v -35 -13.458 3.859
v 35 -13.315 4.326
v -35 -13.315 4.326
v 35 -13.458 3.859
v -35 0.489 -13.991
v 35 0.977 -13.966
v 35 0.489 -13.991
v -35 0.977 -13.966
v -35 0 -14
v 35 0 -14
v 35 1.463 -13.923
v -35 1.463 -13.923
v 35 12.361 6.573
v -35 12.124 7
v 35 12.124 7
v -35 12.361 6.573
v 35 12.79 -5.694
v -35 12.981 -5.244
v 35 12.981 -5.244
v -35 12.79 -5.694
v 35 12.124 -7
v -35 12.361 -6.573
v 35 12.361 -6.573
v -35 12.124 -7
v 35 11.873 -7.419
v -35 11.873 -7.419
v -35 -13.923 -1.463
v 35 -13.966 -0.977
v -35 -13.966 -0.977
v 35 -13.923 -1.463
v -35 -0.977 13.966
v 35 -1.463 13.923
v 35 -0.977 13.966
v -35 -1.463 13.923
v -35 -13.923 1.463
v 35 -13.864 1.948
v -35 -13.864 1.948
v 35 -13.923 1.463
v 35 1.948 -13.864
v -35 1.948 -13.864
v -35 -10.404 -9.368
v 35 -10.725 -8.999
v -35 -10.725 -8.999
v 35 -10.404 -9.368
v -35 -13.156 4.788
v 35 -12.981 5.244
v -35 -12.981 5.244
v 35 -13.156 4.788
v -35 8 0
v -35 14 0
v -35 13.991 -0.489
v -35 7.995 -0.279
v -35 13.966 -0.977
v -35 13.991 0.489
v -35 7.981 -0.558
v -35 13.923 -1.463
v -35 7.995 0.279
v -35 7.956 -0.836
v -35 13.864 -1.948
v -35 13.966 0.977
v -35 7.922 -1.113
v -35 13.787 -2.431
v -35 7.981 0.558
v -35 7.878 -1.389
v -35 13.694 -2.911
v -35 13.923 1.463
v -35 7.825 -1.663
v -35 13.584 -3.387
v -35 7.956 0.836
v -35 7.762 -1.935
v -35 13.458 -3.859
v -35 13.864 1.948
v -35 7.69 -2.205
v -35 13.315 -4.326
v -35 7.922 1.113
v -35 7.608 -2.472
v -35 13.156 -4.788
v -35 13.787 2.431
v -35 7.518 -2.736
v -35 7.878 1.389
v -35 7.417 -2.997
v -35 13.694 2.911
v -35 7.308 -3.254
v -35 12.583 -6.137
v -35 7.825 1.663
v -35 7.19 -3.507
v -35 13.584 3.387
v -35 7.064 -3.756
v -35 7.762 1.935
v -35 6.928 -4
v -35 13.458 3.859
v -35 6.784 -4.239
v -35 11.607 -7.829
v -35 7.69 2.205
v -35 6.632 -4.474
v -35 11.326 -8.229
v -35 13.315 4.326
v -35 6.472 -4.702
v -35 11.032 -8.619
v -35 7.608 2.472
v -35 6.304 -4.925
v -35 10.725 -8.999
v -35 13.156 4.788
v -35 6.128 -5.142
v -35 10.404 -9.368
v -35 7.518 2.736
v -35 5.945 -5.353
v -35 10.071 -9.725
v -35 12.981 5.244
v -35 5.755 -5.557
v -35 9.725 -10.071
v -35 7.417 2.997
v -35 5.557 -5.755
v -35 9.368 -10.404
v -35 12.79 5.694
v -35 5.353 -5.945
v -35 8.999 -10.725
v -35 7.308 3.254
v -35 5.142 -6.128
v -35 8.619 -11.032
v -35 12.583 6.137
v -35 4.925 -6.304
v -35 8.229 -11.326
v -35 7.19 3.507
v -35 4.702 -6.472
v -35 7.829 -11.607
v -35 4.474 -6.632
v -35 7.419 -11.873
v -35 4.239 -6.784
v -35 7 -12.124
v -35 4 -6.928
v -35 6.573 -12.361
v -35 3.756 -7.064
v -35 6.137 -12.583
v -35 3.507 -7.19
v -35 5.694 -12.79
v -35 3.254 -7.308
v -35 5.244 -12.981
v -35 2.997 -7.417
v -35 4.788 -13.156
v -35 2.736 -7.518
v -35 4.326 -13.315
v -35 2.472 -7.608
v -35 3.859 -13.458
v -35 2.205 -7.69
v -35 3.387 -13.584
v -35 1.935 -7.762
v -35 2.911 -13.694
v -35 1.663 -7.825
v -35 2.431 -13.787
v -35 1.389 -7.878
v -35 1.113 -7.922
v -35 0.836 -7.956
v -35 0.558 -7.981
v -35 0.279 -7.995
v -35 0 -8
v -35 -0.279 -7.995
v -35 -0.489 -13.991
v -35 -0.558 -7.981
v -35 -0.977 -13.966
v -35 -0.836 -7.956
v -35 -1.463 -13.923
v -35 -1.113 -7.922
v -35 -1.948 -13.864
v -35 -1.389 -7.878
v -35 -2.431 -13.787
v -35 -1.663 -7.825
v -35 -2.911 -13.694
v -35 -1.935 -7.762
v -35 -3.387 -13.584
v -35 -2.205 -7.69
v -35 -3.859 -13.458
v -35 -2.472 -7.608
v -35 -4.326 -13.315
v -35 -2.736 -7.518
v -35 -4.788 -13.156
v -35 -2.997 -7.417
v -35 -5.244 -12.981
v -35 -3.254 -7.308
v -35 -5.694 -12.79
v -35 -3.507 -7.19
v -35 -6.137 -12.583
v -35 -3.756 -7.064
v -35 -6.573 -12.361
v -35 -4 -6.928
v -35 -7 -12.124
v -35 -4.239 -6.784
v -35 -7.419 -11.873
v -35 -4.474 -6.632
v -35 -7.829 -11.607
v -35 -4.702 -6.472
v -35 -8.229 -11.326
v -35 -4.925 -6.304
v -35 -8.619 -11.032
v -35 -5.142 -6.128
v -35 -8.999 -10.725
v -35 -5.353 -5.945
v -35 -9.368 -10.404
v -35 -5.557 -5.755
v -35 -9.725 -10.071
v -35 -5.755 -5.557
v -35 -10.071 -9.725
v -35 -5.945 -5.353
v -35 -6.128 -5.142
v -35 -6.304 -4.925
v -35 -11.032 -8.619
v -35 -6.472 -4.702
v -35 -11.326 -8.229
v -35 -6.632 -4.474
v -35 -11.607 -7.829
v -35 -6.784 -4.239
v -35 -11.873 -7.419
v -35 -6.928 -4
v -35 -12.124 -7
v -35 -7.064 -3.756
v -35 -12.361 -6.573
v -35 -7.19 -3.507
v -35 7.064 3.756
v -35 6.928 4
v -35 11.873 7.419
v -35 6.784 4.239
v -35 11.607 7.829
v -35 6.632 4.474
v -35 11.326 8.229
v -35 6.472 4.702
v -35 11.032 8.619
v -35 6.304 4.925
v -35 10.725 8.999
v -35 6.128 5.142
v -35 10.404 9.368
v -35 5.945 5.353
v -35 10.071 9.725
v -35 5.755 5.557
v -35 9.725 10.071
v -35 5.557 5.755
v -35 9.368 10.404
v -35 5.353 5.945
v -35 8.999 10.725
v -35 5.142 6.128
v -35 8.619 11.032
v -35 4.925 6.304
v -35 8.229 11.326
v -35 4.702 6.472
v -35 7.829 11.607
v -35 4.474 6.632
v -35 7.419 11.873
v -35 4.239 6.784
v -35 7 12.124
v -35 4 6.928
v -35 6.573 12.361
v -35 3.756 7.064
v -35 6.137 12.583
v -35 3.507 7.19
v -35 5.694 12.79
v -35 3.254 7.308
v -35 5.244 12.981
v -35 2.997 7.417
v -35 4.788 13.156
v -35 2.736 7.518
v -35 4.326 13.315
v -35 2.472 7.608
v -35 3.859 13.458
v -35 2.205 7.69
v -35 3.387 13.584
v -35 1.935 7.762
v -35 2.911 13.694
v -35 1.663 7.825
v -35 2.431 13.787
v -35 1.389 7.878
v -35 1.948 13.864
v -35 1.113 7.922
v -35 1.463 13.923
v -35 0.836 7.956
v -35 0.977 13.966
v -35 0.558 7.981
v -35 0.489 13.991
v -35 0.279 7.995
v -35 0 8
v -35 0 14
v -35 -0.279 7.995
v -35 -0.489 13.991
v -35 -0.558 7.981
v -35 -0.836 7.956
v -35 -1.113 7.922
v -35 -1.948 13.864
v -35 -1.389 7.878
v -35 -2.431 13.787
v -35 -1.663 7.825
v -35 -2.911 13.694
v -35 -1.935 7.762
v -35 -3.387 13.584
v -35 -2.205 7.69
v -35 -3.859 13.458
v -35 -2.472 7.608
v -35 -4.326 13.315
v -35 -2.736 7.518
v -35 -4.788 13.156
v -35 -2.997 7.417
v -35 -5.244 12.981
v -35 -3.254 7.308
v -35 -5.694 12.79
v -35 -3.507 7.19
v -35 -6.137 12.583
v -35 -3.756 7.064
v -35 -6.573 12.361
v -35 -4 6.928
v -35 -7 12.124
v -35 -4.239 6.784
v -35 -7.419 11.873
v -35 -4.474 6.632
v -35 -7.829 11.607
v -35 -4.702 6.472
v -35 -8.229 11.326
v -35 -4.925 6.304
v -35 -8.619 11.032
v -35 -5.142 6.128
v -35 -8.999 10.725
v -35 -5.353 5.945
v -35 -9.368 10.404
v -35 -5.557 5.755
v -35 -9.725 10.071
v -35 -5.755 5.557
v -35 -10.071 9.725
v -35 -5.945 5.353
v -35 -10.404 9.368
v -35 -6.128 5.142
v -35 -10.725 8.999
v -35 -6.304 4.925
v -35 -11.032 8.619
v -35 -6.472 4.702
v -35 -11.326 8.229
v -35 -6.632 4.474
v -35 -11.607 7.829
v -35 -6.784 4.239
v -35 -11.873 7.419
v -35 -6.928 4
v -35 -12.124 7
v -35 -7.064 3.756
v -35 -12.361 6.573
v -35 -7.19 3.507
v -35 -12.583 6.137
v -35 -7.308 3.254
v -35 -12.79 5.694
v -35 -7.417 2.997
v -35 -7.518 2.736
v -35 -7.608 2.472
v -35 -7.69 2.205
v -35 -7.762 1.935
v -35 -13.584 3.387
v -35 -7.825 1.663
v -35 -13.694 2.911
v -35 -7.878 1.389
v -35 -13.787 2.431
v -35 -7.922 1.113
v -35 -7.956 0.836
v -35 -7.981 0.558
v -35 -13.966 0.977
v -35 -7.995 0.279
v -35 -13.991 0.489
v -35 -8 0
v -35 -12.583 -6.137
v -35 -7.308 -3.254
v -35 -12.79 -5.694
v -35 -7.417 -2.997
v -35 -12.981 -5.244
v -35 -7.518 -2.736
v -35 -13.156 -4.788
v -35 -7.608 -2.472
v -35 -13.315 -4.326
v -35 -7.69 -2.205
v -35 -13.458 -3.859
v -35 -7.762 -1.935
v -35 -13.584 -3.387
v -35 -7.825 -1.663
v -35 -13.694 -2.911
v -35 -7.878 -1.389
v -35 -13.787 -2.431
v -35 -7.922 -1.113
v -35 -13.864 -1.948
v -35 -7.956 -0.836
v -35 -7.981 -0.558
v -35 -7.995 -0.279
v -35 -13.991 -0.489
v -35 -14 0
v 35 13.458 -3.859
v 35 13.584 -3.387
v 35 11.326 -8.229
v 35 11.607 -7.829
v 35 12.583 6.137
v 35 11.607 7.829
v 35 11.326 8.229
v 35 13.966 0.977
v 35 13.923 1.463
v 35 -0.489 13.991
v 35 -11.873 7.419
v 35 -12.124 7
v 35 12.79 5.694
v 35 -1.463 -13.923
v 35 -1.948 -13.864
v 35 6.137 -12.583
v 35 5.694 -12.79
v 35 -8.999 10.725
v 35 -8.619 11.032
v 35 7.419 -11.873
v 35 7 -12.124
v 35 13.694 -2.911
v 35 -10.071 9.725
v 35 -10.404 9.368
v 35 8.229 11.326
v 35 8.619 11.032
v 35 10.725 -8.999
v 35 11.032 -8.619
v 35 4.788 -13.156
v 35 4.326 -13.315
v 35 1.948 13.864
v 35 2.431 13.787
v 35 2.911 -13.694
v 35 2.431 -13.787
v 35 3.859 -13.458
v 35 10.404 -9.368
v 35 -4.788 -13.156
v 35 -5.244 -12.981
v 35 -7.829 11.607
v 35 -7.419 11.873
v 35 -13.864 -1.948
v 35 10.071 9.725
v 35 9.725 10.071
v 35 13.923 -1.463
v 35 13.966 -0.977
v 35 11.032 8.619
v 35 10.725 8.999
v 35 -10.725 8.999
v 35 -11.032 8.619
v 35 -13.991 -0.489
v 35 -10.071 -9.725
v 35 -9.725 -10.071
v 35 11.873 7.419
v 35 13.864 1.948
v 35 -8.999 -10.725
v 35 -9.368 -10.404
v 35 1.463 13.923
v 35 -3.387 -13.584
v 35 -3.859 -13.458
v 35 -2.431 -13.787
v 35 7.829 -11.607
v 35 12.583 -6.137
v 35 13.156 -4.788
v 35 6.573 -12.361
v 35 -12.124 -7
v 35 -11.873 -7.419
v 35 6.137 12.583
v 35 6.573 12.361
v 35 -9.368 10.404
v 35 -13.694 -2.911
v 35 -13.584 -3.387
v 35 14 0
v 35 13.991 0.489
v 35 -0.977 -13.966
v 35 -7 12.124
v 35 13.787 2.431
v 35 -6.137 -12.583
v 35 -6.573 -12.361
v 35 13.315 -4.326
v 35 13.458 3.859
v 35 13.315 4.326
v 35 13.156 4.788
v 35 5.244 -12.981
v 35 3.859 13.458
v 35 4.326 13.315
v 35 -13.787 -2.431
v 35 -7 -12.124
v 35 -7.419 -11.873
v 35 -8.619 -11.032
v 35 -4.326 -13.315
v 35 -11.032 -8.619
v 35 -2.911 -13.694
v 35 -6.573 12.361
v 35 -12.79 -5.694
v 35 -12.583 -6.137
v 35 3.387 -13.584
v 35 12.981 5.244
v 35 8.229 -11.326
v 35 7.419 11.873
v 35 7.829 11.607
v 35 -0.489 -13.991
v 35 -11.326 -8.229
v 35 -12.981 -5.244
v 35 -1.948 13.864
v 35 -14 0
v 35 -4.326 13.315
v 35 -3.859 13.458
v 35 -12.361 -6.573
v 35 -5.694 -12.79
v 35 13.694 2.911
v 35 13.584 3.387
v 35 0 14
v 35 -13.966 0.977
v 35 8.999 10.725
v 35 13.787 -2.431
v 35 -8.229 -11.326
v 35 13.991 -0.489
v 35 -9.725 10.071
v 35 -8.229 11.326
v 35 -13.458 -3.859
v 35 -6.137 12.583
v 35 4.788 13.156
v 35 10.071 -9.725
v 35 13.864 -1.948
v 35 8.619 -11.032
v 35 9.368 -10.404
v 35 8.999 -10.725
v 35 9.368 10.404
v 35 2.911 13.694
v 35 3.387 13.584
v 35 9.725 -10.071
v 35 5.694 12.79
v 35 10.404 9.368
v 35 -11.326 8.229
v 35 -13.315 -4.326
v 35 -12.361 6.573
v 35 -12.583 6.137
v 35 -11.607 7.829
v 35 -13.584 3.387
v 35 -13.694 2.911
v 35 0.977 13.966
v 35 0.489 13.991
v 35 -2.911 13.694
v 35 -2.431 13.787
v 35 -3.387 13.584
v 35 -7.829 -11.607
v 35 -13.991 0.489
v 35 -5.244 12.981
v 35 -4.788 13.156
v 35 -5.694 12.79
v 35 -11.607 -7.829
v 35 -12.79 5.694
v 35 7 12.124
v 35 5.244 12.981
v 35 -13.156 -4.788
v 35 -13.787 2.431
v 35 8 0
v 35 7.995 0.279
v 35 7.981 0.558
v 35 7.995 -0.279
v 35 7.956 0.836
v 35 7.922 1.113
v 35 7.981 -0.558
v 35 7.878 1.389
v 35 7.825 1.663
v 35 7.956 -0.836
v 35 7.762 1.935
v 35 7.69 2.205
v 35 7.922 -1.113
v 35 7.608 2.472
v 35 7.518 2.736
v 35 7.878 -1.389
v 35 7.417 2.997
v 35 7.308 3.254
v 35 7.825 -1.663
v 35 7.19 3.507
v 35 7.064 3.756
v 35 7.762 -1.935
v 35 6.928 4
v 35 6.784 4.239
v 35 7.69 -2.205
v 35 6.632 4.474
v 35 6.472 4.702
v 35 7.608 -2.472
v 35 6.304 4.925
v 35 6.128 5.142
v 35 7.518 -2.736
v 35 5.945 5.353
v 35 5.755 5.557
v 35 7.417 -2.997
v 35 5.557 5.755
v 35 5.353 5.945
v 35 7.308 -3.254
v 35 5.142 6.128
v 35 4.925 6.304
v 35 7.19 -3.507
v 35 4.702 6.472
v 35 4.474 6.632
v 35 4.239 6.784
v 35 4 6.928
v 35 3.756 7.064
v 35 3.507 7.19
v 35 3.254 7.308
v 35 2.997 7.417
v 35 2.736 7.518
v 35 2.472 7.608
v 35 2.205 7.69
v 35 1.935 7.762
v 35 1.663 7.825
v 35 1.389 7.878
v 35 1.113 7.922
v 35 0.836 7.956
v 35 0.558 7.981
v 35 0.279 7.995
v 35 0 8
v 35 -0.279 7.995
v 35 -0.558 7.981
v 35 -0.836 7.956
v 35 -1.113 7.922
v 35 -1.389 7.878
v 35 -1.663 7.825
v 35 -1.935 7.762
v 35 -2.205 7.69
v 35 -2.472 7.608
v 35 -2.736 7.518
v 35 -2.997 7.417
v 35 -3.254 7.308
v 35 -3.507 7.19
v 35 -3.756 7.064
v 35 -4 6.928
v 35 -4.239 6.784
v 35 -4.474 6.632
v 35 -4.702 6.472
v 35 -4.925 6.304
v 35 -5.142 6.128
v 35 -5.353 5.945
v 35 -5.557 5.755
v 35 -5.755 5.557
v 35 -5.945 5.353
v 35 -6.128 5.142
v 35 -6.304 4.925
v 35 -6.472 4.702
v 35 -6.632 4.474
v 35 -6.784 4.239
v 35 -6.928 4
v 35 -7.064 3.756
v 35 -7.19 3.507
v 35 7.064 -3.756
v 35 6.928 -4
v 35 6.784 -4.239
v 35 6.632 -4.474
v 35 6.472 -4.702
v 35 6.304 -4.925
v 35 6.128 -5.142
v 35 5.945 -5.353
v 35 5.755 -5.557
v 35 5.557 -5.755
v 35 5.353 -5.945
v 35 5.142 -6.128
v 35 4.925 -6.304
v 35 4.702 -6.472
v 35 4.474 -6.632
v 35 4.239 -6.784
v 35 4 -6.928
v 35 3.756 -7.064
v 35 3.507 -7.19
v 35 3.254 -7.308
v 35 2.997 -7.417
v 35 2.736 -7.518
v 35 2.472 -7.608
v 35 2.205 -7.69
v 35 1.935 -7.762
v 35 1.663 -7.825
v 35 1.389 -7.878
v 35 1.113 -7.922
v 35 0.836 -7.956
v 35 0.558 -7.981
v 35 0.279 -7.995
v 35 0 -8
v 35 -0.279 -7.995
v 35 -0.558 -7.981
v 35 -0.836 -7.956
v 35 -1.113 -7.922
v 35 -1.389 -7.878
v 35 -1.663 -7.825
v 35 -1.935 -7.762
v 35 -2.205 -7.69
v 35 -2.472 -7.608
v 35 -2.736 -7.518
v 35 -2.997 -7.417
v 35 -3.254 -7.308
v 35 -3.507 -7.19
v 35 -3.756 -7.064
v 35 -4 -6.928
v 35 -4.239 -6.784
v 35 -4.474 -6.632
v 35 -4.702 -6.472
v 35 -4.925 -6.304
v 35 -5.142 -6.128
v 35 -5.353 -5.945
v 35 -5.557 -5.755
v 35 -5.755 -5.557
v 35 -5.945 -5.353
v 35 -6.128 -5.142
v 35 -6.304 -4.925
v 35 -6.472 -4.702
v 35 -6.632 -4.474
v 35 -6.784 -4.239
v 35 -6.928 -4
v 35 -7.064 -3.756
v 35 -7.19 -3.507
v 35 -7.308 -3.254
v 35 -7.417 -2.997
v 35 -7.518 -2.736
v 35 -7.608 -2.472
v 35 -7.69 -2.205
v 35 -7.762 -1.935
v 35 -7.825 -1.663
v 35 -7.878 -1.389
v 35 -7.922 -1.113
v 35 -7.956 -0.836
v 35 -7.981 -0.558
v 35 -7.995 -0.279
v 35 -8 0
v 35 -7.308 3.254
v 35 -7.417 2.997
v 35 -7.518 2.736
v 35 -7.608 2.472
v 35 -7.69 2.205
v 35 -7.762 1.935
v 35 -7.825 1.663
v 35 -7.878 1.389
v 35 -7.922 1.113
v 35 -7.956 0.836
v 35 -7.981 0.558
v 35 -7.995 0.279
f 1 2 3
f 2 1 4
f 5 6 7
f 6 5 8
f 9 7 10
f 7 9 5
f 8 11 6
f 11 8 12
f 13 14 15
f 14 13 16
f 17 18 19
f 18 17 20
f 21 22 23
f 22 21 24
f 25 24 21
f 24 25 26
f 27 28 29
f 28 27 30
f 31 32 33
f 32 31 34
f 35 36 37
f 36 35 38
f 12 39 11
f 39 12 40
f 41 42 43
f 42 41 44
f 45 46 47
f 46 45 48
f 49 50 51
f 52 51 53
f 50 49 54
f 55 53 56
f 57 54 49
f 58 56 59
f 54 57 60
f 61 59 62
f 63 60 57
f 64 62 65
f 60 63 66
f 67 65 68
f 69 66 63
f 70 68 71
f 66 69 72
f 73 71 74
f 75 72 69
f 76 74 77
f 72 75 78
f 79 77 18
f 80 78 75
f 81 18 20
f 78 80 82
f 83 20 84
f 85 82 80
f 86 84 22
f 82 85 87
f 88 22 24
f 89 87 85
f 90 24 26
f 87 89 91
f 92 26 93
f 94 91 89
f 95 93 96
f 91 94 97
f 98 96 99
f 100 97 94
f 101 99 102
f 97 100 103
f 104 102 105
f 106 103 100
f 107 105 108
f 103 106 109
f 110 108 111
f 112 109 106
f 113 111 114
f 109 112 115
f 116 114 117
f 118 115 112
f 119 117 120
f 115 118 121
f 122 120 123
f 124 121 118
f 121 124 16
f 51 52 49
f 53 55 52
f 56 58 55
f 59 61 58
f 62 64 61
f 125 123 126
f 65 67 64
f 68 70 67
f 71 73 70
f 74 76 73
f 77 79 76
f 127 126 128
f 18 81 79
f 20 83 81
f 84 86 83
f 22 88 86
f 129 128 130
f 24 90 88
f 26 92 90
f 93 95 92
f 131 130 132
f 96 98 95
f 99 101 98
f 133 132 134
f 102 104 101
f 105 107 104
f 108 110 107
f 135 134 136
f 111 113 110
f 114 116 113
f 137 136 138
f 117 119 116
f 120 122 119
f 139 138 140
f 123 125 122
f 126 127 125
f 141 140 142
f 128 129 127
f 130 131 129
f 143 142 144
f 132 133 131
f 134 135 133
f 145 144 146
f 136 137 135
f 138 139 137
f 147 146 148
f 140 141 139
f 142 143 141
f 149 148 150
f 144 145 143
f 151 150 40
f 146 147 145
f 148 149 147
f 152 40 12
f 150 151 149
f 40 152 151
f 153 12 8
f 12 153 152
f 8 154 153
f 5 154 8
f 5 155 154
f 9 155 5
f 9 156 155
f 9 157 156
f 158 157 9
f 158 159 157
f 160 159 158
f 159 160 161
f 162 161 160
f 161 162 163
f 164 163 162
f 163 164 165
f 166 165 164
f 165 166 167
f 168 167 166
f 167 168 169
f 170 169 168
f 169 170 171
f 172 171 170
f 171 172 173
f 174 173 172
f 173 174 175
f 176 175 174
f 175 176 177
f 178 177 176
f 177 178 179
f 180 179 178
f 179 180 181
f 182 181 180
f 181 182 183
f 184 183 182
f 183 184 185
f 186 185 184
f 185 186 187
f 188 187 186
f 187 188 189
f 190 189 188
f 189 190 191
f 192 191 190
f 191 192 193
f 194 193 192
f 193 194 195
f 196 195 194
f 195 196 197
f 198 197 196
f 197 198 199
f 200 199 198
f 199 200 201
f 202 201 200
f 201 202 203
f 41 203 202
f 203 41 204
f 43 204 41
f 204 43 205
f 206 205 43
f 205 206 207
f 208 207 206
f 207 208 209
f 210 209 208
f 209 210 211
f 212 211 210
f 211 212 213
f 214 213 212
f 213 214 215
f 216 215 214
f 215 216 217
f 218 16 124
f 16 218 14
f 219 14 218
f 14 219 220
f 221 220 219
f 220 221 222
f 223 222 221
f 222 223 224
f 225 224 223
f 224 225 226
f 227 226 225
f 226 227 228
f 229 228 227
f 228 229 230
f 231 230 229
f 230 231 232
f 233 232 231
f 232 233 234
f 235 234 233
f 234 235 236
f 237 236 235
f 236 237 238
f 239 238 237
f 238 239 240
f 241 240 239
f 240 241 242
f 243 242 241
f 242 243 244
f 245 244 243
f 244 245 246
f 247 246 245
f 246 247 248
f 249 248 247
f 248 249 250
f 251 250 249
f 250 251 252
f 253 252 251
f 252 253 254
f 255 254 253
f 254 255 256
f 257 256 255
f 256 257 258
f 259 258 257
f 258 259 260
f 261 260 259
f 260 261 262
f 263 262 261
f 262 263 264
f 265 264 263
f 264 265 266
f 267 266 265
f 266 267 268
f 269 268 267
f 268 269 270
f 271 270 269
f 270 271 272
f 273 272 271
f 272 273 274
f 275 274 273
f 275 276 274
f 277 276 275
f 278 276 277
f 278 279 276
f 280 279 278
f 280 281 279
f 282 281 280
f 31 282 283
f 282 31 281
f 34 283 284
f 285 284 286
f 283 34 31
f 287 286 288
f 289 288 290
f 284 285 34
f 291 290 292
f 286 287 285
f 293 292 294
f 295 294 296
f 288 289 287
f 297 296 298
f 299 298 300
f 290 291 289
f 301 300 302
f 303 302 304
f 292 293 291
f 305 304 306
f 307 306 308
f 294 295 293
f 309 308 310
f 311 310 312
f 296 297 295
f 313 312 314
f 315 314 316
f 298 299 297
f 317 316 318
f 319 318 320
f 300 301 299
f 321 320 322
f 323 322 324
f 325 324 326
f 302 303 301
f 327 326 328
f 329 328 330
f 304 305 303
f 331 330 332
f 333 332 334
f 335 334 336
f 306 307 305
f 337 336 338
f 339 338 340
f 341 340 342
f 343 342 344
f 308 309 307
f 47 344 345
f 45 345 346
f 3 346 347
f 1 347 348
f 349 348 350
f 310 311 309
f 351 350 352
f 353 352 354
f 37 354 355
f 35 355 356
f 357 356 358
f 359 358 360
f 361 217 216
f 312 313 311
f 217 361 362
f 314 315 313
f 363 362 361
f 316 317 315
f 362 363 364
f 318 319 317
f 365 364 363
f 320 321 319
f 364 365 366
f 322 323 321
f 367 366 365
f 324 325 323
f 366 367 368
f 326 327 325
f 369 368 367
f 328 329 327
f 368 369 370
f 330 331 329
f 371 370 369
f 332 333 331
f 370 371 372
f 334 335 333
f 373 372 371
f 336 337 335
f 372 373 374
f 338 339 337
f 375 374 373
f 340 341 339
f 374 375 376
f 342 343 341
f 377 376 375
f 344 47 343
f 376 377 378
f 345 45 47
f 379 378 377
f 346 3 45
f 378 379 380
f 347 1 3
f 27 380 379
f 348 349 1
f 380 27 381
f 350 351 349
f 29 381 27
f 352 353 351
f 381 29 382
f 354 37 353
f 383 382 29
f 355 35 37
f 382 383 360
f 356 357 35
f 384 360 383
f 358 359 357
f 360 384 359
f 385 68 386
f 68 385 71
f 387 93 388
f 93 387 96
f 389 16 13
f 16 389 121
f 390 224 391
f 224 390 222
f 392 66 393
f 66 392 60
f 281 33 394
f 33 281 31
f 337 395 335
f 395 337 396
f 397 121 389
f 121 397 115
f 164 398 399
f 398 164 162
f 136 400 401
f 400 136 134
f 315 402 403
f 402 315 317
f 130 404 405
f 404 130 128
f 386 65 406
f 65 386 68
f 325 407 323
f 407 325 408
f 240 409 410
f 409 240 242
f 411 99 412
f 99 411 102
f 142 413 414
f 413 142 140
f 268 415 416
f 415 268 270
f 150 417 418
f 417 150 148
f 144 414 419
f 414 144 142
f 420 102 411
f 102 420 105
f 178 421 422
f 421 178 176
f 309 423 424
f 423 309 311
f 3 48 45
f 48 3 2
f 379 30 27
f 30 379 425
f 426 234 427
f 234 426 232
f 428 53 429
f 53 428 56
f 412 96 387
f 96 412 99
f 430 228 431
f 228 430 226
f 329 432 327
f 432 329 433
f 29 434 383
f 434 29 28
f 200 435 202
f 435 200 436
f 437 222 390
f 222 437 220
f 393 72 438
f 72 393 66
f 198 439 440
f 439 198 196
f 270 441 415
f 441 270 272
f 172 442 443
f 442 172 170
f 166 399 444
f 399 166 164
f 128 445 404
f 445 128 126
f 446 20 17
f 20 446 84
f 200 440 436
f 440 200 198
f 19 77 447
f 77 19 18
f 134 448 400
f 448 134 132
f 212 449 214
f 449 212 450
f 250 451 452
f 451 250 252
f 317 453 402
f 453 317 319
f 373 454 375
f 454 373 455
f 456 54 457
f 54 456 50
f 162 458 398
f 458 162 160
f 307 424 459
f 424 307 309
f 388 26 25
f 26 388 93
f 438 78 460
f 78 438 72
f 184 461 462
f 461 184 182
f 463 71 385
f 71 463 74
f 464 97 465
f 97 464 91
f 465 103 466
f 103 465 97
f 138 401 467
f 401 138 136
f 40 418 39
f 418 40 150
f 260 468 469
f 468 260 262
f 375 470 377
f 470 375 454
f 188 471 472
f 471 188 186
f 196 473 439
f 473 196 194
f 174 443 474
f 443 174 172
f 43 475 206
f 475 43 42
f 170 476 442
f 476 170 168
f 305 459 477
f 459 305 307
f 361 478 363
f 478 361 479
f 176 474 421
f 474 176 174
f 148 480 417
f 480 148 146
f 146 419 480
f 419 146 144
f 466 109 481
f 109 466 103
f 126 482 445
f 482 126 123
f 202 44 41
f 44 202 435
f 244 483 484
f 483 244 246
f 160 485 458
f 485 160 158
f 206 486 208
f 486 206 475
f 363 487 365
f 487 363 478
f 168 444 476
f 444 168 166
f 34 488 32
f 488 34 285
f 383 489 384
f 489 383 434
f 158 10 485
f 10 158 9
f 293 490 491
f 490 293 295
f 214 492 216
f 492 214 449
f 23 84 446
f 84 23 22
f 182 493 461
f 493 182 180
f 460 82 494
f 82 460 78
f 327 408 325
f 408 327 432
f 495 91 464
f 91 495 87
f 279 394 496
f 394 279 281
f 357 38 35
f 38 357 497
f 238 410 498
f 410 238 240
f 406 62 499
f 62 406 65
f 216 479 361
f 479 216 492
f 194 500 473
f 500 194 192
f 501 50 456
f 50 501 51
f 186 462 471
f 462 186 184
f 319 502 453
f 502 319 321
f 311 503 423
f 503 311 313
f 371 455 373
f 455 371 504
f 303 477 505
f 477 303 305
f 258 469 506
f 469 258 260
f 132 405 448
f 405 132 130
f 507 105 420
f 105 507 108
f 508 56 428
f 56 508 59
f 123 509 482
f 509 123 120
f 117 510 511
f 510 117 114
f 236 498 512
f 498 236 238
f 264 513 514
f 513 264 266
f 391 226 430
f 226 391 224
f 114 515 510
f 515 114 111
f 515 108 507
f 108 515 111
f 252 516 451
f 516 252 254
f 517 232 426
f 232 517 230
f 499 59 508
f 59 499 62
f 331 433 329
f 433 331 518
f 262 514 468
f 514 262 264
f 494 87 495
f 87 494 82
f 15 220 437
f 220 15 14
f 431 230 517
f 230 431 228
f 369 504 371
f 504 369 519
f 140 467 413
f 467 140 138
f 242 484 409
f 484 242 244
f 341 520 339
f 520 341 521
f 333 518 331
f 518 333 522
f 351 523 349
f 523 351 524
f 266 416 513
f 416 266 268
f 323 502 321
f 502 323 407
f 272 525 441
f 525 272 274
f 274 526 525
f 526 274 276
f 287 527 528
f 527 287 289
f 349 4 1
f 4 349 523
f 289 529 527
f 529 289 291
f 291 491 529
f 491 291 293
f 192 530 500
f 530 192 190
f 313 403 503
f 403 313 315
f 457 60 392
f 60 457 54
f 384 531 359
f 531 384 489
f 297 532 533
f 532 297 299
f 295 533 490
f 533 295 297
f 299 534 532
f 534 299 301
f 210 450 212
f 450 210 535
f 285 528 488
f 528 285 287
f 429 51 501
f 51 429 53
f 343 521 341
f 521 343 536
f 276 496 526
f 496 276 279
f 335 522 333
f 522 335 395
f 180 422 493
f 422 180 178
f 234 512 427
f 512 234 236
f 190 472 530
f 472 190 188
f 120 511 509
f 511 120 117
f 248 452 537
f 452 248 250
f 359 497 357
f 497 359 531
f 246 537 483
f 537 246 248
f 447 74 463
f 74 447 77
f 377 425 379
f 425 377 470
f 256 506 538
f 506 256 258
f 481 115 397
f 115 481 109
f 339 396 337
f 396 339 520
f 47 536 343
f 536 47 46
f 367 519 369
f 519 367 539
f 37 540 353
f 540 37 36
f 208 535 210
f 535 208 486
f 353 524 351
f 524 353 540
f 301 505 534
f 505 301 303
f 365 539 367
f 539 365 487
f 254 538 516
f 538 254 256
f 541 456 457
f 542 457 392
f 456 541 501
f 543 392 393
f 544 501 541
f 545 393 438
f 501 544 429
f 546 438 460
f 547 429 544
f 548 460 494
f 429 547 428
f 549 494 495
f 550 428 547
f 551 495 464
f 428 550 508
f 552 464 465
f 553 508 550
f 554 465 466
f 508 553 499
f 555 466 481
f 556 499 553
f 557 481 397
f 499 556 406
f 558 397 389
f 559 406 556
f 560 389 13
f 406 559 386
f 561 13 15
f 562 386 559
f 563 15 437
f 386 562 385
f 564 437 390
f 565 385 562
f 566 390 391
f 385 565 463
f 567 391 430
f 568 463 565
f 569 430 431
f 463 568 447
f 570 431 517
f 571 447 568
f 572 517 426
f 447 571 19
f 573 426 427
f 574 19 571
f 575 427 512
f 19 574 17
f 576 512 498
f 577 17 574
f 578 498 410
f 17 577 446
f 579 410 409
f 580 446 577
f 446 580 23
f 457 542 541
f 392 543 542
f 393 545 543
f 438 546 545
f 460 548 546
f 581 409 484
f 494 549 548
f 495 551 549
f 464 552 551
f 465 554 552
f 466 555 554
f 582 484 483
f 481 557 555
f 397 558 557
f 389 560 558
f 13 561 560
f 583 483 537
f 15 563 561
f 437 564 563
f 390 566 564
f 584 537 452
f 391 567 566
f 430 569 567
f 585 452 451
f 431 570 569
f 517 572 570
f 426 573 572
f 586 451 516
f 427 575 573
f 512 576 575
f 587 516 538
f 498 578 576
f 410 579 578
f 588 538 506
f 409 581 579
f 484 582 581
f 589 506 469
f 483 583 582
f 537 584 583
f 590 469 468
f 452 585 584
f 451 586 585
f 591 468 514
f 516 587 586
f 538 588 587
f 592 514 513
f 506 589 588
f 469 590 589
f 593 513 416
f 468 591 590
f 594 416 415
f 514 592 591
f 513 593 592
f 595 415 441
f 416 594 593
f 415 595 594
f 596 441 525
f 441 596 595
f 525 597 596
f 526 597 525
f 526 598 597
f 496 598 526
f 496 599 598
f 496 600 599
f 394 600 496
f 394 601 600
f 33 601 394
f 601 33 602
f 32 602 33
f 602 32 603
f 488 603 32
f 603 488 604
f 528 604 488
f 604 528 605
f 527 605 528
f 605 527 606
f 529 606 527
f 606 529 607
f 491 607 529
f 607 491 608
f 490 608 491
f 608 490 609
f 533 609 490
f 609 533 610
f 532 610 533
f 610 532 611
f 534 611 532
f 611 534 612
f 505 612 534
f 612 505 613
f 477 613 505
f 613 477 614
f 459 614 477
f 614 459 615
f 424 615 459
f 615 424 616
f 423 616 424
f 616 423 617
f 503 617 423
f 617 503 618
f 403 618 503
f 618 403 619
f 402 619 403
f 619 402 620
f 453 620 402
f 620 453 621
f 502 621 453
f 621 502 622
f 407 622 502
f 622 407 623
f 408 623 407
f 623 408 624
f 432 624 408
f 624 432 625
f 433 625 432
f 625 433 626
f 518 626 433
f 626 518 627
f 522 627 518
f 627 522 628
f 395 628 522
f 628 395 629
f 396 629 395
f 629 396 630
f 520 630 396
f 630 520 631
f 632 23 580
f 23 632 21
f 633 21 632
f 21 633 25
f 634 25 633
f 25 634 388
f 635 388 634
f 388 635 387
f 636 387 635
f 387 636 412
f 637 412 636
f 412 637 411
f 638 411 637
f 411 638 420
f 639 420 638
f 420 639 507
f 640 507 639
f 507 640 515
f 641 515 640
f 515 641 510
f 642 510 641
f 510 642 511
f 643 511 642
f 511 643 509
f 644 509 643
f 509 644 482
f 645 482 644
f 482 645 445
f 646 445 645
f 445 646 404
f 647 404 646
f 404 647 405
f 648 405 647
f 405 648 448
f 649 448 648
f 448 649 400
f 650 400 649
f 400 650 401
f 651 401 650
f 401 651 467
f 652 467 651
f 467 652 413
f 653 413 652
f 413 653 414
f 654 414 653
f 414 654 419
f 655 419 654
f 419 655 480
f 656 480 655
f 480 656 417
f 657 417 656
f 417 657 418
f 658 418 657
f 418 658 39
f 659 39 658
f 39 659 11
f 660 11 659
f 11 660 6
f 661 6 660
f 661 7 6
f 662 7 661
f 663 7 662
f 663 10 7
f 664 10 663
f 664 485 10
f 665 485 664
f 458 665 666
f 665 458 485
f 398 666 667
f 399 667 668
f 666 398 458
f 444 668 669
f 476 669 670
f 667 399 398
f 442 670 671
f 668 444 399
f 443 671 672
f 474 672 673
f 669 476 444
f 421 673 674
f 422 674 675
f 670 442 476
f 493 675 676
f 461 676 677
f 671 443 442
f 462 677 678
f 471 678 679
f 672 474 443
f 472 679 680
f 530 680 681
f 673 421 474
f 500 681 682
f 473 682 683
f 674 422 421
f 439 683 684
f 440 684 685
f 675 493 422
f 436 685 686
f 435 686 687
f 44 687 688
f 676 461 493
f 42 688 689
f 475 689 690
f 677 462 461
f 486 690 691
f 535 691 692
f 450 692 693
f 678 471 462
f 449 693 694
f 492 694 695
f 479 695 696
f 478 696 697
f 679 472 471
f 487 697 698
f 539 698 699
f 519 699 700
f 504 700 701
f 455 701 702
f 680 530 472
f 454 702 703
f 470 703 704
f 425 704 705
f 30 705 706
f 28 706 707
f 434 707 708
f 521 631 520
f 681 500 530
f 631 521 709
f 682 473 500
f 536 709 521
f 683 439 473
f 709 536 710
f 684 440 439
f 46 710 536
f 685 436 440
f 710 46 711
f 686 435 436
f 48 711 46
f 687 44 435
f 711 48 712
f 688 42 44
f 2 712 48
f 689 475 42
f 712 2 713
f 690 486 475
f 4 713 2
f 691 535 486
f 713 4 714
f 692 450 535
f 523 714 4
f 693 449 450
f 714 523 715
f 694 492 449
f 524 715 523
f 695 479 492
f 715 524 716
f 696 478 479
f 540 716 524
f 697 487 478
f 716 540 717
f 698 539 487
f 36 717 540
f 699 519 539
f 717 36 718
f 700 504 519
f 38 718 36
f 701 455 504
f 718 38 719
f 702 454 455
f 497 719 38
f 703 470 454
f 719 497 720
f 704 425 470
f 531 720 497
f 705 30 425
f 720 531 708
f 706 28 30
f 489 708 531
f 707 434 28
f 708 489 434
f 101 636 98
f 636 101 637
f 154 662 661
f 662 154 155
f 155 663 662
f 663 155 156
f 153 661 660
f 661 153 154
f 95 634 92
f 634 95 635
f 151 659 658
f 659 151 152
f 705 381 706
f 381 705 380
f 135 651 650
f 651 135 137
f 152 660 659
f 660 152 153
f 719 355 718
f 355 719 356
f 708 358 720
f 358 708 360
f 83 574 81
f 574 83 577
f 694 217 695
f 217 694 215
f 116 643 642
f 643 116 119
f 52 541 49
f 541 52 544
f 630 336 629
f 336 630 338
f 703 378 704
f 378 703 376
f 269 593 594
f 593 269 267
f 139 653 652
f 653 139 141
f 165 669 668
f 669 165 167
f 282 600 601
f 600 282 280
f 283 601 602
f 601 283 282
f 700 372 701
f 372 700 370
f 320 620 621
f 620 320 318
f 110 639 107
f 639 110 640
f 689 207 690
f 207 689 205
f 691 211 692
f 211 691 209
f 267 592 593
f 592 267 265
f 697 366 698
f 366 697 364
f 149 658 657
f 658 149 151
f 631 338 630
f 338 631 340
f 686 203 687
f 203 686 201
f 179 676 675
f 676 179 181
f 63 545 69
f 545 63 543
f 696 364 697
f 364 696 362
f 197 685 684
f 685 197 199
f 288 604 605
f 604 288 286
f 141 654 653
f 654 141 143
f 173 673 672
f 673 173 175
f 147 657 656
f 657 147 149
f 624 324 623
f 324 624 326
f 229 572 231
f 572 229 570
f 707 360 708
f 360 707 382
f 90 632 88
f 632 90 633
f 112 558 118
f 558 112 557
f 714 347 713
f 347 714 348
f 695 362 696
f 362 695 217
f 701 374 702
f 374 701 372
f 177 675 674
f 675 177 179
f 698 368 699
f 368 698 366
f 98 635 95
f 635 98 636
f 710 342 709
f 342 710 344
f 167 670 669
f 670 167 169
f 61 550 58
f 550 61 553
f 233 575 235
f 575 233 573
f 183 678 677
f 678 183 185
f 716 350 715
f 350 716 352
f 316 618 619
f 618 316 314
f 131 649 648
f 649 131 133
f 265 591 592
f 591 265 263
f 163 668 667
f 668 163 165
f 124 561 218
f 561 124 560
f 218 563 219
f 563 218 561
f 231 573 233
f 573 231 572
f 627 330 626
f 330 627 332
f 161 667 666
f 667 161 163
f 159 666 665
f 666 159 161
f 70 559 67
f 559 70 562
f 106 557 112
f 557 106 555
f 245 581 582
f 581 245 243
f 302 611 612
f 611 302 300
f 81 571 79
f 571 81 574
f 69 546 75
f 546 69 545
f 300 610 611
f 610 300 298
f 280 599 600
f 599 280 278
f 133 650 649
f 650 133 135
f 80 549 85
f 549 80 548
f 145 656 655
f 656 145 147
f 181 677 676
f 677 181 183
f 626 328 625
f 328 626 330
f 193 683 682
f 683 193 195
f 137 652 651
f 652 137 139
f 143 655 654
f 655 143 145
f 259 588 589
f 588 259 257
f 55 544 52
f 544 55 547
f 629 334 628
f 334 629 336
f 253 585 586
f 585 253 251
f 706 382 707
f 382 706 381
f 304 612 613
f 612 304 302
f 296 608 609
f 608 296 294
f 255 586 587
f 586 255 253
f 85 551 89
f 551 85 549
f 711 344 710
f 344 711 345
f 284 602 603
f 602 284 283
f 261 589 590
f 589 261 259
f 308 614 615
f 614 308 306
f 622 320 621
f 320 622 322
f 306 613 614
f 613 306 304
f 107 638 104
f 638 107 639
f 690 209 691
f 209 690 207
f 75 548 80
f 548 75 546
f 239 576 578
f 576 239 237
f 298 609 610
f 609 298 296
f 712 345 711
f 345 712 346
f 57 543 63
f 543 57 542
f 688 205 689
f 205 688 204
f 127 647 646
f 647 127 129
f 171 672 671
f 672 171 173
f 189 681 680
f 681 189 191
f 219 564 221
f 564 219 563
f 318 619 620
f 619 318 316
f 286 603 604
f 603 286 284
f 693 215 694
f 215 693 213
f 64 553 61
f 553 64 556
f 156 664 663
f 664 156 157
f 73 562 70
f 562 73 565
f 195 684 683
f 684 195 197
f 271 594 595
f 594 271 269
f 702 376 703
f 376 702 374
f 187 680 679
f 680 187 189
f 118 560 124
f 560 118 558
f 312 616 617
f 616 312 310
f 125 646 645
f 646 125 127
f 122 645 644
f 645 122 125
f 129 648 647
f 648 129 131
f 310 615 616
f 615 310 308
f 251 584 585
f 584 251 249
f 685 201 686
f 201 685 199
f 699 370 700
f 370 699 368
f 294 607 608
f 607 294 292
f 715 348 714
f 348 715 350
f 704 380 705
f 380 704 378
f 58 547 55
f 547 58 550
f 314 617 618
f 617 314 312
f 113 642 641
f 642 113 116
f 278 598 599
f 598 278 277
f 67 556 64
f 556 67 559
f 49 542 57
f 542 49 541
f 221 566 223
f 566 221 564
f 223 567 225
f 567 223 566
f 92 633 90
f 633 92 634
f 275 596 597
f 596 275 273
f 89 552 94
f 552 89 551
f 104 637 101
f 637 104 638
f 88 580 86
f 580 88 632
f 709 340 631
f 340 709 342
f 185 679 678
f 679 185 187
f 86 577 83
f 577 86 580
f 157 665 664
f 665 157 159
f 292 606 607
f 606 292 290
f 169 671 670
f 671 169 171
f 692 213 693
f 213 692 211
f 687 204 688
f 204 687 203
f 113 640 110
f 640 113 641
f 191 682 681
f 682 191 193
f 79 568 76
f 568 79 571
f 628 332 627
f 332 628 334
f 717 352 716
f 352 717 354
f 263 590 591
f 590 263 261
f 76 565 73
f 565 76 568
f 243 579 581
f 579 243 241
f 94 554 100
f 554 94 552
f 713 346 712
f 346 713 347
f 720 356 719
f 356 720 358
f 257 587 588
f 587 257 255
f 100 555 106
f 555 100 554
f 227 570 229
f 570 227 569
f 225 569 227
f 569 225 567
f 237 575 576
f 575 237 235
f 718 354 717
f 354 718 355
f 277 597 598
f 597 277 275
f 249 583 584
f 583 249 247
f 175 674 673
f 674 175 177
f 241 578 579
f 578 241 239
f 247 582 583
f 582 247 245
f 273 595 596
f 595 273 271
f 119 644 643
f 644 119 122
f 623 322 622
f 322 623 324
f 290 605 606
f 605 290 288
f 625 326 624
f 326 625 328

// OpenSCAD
$fn = 180;

bore_d  = 16.0;
outer_d = 28.0;
length  = 70.0;

eps = 0.2;

// Bearing axis along X so TOP/BOTTOM views show the bore opening
rotate([0, 90, 0])
difference() {
    cylinder(d = outer_d, h = length, center = true);
    cylinder(d = bore_d,  h = length + eps, center = true);
}
